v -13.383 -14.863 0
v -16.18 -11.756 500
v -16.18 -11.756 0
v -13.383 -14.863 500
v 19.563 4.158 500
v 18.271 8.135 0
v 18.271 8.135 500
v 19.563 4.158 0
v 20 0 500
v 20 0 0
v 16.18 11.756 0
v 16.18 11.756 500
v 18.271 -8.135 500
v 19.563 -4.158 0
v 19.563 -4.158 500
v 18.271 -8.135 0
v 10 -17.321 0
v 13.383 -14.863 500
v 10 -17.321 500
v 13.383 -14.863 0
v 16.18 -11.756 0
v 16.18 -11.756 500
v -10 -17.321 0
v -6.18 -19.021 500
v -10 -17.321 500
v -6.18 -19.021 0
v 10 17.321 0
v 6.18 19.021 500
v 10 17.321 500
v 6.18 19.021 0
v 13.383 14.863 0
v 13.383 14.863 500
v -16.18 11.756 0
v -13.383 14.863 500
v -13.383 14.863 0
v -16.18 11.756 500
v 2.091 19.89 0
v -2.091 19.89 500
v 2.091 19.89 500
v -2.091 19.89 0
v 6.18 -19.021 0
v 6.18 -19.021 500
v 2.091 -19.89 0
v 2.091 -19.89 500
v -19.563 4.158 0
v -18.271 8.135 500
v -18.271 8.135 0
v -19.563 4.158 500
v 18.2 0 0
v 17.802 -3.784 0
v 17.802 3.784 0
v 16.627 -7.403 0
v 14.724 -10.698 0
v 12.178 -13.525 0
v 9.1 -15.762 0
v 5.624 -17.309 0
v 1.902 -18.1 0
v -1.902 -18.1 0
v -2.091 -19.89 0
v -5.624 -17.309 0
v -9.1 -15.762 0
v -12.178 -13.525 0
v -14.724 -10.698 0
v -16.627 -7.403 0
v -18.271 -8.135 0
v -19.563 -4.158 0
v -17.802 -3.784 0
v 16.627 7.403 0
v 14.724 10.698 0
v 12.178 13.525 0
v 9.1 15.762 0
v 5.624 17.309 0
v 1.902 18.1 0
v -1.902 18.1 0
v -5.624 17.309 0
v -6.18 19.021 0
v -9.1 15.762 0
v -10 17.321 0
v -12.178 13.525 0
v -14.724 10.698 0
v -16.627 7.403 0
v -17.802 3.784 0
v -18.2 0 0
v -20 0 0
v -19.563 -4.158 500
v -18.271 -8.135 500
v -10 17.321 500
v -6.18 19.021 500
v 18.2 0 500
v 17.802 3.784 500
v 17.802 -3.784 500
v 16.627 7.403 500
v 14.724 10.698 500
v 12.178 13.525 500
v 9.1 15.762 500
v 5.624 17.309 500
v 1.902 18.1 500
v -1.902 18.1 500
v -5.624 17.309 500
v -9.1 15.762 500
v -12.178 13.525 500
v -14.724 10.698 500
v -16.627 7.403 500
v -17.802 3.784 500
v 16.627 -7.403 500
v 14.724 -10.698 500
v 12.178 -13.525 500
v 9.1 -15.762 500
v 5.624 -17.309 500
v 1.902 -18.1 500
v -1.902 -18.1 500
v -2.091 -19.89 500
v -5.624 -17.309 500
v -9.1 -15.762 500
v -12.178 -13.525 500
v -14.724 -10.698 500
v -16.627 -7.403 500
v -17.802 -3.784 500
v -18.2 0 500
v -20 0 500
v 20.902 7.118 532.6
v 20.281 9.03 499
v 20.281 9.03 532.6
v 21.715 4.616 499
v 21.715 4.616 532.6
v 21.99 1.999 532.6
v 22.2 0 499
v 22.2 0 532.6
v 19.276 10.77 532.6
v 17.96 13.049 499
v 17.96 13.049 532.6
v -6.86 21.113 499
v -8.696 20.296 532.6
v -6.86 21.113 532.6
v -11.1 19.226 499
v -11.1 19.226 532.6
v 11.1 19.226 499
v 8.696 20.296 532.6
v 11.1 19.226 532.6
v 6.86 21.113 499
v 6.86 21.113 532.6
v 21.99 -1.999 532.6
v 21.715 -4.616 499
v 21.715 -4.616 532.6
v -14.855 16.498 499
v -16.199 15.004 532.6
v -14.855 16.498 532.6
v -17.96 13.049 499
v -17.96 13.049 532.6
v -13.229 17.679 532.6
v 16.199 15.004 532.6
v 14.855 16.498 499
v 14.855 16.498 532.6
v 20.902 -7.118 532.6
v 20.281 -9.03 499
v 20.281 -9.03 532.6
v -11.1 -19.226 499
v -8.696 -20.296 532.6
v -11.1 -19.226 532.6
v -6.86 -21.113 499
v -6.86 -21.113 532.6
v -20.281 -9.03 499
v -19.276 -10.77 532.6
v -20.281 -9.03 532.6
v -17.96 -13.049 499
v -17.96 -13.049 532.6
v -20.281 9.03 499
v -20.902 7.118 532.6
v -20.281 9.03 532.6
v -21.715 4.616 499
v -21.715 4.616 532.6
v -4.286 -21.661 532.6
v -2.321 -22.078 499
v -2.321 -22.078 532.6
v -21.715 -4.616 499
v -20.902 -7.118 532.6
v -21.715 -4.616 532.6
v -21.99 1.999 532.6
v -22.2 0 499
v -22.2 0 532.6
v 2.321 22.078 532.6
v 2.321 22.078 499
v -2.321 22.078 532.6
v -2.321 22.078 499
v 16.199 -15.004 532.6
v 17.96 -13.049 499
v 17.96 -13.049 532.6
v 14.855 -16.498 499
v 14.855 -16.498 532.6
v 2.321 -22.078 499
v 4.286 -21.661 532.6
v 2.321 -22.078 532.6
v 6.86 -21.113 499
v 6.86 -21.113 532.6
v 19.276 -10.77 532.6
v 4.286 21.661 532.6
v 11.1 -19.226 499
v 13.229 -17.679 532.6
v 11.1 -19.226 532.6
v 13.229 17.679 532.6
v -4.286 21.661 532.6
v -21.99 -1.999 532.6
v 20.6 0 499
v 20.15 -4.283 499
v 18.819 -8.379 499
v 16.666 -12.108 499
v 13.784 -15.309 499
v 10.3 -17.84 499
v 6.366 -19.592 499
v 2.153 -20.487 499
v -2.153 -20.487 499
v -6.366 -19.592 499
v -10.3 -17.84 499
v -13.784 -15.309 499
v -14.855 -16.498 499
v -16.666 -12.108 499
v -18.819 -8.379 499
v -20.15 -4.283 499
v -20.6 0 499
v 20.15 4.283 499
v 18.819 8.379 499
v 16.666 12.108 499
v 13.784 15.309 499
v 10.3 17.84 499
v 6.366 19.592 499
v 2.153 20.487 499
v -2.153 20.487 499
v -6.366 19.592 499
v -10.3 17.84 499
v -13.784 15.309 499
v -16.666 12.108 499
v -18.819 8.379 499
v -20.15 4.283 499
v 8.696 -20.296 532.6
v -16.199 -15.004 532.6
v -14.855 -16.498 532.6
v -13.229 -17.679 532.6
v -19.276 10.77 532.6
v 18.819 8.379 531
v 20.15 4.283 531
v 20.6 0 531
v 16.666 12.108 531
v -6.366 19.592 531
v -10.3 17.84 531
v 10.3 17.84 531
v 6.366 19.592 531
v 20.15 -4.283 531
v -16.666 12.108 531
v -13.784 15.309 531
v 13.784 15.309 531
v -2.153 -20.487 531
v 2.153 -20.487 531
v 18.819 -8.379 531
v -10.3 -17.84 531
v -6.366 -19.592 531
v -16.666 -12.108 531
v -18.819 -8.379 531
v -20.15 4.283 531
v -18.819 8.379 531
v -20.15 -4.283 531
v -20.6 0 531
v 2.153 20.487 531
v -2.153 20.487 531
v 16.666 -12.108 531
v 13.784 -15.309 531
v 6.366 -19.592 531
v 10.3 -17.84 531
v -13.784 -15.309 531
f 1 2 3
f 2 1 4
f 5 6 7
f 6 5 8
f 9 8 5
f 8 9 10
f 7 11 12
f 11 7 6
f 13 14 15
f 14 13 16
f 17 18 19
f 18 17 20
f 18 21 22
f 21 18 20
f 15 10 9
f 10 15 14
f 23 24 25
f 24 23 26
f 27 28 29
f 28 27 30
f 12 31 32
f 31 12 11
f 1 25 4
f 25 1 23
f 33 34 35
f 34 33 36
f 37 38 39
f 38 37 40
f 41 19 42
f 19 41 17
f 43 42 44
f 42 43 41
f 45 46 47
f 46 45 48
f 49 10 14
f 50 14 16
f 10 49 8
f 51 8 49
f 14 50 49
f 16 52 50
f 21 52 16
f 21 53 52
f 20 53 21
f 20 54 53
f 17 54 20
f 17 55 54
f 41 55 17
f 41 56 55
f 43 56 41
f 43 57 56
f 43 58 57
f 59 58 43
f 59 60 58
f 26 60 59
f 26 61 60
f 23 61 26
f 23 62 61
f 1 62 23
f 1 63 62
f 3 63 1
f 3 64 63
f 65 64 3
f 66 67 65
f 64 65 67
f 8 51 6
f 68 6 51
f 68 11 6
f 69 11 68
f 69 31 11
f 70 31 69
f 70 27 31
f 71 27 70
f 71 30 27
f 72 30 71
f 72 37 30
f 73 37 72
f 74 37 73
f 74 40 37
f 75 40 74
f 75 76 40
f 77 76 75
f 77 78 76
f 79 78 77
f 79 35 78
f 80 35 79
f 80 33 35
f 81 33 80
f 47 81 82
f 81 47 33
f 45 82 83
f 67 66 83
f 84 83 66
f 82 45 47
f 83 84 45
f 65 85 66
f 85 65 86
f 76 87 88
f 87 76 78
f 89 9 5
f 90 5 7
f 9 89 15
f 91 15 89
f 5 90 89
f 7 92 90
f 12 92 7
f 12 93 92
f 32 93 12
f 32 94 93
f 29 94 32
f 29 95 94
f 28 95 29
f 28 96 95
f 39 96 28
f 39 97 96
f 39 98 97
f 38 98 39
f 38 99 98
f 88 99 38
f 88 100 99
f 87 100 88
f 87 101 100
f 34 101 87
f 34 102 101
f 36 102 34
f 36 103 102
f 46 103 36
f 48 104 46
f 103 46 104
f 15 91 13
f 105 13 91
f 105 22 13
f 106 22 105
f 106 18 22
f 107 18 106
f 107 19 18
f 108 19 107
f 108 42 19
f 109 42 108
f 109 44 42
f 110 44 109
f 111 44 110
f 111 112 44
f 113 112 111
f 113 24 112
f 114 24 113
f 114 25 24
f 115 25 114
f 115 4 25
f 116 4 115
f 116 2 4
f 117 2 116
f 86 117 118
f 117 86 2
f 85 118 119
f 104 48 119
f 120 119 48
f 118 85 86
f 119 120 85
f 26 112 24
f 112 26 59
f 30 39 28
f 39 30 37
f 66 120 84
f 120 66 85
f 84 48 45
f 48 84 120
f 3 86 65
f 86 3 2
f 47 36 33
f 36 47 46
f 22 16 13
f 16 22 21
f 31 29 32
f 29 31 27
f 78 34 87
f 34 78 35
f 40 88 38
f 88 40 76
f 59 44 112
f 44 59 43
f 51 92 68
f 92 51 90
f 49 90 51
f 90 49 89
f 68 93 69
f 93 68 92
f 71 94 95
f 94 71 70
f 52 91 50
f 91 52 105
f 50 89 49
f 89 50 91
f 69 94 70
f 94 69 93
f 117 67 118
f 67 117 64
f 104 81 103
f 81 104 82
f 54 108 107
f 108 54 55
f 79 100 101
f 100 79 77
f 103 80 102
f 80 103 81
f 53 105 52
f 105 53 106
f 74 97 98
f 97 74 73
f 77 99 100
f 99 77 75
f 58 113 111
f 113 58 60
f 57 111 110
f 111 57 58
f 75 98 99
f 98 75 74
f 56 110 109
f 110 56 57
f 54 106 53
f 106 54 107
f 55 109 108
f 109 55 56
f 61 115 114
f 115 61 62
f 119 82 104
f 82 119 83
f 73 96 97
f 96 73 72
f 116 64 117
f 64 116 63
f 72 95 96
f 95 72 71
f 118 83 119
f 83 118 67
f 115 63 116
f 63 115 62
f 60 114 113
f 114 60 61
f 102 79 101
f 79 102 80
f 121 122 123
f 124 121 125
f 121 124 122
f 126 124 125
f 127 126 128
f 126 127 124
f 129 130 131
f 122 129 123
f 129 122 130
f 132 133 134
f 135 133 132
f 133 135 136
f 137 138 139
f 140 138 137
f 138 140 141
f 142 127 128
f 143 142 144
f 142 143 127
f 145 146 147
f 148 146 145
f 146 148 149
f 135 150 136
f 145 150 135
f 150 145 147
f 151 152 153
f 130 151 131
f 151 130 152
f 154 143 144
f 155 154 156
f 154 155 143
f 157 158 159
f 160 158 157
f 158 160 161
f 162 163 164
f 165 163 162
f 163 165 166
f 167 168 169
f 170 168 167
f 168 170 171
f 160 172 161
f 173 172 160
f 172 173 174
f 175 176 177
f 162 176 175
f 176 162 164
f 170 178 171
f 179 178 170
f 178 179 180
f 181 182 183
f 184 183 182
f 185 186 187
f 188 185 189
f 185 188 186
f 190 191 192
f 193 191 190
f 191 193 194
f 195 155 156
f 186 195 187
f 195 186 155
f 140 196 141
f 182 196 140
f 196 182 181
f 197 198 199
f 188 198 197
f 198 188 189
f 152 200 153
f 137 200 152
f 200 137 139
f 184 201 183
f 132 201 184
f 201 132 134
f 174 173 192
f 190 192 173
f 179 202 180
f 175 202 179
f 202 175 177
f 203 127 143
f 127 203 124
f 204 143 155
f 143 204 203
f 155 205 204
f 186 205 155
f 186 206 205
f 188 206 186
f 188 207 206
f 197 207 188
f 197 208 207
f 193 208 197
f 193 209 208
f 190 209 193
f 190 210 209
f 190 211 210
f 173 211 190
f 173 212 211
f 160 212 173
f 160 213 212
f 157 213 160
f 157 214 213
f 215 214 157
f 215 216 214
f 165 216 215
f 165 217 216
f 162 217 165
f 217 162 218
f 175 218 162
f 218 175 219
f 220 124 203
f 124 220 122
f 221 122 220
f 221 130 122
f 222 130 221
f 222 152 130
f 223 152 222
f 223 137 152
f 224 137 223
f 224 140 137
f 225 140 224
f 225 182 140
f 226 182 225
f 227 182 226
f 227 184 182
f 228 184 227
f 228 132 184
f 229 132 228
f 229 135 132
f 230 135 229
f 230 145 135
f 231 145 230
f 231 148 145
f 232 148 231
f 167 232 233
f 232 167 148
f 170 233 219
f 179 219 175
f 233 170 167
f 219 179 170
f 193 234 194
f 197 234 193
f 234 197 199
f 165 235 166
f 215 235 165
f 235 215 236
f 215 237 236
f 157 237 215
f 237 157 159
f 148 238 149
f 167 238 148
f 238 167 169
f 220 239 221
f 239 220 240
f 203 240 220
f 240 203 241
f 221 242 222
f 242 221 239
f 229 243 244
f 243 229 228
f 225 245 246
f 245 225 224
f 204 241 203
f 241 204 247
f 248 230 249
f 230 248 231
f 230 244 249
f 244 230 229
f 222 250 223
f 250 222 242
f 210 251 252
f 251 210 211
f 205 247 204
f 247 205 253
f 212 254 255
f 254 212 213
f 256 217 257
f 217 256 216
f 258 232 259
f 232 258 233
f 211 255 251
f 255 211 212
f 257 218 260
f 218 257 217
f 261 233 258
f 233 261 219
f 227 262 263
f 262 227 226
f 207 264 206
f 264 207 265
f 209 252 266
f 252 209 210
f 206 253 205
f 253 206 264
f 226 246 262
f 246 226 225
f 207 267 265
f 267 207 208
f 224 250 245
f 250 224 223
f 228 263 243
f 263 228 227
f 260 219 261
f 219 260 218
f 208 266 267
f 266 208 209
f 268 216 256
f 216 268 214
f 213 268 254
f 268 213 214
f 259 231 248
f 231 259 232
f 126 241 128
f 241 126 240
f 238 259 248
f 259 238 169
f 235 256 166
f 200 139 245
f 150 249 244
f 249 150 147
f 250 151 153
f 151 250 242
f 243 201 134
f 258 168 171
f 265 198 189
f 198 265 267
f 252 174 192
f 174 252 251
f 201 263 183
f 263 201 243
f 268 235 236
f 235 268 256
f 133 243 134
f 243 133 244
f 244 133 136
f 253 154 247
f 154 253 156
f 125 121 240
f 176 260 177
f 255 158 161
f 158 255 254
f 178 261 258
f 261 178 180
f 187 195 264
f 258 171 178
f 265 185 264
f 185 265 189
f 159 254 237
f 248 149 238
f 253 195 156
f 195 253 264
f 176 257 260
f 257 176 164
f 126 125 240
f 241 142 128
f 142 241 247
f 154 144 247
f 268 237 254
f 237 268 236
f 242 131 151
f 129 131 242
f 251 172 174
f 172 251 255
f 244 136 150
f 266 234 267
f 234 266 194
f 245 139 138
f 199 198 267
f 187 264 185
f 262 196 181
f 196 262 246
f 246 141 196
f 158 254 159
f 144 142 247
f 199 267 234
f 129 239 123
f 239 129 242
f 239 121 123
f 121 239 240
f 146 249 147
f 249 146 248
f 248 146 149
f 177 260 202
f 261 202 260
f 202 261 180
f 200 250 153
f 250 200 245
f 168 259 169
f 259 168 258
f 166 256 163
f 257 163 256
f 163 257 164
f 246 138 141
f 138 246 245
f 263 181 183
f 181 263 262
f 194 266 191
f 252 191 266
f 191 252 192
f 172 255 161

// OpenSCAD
// Parameters
pipe_standard = 0; //[0:0:1]
nominal_diameter_mm = 40; //[20:80:1]
length_mm = 500; //[250:1000:1]
include_end_fitting = 1; //[0:1:1]
ht40_outer_diameter = 40; //[30:60:0.5]
pipe_wall_thickness = 1.8; //[1.0:3.6:0.1]
fit_overlap = 1; //[0.5:2:0.1]
socket_length = 35; //[20:70:1]
socket_wall_extra = 2.2; //[1.0:5.0:0.1]
socket_clearance = 0.6; //[0.2:1.2:0.1]
stop_ring_thickness = 2; //[1:5:0.1]
stop_ring_radial = 1.2; //[0.5:3:0.1]
chamfer_length = 3; //[1:8:0.5]

// Ht Pipe - complete geometry
module ht_pipe() {
  color([0.85, 0.85, 0.8]) { // PVC color
    // Pipe body
    difference() {
      translate([0, 0, 0])
        cylinder(h=length_mm, r=ht40_outer_diameter/2, center=false);
      translate([0, 0, -fit_overlap])
        cylinder(h=length_mm + fit_overlap, r=ht40_outer_diameter/2 - pipe_wall_thickness, center=false);
    }
    
    // End fitting
    if (include_end_fitting) {
      difference() {
        // Socket shell
        translate([0, 0, length_mm - fit_overlap])
          cylinder(h=socket_length, r=ht40_outer_diameter/2 + socket_wall_extra, center=false);
        
        // Socket inner void
        translate([0, 0, length_mm - fit_overlap])
          cylinder(h=socket_length + fit_overlap, r=ht40_outer_diameter/2 + socket_clearance, center=false);
        
        // Stop ring void
        translate([0, 0, length_mm - fit_overlap + socket_length - stop_ring_thickness])
          cylinder(h=stop_ring_thickness + fit_overlap, r=ht40_outer_diameter/2 + socket_clearance - stop_ring_radial, center=false);
        
        // Mouth chamfer void
        translate([0, 0, length_mm - fit_overlap + socket_length - chamfer_length])
          cylinder(h=chamfer_length, r1=ht40_outer_diameter/2 + socket_clearance, r2=ht40_outer_diameter/2 + socket_clearance + chamfer_length, center=false);
      }
    }
  }
}

// Assembly
module assembly() {
  ht_pipe();
}

assembly();
